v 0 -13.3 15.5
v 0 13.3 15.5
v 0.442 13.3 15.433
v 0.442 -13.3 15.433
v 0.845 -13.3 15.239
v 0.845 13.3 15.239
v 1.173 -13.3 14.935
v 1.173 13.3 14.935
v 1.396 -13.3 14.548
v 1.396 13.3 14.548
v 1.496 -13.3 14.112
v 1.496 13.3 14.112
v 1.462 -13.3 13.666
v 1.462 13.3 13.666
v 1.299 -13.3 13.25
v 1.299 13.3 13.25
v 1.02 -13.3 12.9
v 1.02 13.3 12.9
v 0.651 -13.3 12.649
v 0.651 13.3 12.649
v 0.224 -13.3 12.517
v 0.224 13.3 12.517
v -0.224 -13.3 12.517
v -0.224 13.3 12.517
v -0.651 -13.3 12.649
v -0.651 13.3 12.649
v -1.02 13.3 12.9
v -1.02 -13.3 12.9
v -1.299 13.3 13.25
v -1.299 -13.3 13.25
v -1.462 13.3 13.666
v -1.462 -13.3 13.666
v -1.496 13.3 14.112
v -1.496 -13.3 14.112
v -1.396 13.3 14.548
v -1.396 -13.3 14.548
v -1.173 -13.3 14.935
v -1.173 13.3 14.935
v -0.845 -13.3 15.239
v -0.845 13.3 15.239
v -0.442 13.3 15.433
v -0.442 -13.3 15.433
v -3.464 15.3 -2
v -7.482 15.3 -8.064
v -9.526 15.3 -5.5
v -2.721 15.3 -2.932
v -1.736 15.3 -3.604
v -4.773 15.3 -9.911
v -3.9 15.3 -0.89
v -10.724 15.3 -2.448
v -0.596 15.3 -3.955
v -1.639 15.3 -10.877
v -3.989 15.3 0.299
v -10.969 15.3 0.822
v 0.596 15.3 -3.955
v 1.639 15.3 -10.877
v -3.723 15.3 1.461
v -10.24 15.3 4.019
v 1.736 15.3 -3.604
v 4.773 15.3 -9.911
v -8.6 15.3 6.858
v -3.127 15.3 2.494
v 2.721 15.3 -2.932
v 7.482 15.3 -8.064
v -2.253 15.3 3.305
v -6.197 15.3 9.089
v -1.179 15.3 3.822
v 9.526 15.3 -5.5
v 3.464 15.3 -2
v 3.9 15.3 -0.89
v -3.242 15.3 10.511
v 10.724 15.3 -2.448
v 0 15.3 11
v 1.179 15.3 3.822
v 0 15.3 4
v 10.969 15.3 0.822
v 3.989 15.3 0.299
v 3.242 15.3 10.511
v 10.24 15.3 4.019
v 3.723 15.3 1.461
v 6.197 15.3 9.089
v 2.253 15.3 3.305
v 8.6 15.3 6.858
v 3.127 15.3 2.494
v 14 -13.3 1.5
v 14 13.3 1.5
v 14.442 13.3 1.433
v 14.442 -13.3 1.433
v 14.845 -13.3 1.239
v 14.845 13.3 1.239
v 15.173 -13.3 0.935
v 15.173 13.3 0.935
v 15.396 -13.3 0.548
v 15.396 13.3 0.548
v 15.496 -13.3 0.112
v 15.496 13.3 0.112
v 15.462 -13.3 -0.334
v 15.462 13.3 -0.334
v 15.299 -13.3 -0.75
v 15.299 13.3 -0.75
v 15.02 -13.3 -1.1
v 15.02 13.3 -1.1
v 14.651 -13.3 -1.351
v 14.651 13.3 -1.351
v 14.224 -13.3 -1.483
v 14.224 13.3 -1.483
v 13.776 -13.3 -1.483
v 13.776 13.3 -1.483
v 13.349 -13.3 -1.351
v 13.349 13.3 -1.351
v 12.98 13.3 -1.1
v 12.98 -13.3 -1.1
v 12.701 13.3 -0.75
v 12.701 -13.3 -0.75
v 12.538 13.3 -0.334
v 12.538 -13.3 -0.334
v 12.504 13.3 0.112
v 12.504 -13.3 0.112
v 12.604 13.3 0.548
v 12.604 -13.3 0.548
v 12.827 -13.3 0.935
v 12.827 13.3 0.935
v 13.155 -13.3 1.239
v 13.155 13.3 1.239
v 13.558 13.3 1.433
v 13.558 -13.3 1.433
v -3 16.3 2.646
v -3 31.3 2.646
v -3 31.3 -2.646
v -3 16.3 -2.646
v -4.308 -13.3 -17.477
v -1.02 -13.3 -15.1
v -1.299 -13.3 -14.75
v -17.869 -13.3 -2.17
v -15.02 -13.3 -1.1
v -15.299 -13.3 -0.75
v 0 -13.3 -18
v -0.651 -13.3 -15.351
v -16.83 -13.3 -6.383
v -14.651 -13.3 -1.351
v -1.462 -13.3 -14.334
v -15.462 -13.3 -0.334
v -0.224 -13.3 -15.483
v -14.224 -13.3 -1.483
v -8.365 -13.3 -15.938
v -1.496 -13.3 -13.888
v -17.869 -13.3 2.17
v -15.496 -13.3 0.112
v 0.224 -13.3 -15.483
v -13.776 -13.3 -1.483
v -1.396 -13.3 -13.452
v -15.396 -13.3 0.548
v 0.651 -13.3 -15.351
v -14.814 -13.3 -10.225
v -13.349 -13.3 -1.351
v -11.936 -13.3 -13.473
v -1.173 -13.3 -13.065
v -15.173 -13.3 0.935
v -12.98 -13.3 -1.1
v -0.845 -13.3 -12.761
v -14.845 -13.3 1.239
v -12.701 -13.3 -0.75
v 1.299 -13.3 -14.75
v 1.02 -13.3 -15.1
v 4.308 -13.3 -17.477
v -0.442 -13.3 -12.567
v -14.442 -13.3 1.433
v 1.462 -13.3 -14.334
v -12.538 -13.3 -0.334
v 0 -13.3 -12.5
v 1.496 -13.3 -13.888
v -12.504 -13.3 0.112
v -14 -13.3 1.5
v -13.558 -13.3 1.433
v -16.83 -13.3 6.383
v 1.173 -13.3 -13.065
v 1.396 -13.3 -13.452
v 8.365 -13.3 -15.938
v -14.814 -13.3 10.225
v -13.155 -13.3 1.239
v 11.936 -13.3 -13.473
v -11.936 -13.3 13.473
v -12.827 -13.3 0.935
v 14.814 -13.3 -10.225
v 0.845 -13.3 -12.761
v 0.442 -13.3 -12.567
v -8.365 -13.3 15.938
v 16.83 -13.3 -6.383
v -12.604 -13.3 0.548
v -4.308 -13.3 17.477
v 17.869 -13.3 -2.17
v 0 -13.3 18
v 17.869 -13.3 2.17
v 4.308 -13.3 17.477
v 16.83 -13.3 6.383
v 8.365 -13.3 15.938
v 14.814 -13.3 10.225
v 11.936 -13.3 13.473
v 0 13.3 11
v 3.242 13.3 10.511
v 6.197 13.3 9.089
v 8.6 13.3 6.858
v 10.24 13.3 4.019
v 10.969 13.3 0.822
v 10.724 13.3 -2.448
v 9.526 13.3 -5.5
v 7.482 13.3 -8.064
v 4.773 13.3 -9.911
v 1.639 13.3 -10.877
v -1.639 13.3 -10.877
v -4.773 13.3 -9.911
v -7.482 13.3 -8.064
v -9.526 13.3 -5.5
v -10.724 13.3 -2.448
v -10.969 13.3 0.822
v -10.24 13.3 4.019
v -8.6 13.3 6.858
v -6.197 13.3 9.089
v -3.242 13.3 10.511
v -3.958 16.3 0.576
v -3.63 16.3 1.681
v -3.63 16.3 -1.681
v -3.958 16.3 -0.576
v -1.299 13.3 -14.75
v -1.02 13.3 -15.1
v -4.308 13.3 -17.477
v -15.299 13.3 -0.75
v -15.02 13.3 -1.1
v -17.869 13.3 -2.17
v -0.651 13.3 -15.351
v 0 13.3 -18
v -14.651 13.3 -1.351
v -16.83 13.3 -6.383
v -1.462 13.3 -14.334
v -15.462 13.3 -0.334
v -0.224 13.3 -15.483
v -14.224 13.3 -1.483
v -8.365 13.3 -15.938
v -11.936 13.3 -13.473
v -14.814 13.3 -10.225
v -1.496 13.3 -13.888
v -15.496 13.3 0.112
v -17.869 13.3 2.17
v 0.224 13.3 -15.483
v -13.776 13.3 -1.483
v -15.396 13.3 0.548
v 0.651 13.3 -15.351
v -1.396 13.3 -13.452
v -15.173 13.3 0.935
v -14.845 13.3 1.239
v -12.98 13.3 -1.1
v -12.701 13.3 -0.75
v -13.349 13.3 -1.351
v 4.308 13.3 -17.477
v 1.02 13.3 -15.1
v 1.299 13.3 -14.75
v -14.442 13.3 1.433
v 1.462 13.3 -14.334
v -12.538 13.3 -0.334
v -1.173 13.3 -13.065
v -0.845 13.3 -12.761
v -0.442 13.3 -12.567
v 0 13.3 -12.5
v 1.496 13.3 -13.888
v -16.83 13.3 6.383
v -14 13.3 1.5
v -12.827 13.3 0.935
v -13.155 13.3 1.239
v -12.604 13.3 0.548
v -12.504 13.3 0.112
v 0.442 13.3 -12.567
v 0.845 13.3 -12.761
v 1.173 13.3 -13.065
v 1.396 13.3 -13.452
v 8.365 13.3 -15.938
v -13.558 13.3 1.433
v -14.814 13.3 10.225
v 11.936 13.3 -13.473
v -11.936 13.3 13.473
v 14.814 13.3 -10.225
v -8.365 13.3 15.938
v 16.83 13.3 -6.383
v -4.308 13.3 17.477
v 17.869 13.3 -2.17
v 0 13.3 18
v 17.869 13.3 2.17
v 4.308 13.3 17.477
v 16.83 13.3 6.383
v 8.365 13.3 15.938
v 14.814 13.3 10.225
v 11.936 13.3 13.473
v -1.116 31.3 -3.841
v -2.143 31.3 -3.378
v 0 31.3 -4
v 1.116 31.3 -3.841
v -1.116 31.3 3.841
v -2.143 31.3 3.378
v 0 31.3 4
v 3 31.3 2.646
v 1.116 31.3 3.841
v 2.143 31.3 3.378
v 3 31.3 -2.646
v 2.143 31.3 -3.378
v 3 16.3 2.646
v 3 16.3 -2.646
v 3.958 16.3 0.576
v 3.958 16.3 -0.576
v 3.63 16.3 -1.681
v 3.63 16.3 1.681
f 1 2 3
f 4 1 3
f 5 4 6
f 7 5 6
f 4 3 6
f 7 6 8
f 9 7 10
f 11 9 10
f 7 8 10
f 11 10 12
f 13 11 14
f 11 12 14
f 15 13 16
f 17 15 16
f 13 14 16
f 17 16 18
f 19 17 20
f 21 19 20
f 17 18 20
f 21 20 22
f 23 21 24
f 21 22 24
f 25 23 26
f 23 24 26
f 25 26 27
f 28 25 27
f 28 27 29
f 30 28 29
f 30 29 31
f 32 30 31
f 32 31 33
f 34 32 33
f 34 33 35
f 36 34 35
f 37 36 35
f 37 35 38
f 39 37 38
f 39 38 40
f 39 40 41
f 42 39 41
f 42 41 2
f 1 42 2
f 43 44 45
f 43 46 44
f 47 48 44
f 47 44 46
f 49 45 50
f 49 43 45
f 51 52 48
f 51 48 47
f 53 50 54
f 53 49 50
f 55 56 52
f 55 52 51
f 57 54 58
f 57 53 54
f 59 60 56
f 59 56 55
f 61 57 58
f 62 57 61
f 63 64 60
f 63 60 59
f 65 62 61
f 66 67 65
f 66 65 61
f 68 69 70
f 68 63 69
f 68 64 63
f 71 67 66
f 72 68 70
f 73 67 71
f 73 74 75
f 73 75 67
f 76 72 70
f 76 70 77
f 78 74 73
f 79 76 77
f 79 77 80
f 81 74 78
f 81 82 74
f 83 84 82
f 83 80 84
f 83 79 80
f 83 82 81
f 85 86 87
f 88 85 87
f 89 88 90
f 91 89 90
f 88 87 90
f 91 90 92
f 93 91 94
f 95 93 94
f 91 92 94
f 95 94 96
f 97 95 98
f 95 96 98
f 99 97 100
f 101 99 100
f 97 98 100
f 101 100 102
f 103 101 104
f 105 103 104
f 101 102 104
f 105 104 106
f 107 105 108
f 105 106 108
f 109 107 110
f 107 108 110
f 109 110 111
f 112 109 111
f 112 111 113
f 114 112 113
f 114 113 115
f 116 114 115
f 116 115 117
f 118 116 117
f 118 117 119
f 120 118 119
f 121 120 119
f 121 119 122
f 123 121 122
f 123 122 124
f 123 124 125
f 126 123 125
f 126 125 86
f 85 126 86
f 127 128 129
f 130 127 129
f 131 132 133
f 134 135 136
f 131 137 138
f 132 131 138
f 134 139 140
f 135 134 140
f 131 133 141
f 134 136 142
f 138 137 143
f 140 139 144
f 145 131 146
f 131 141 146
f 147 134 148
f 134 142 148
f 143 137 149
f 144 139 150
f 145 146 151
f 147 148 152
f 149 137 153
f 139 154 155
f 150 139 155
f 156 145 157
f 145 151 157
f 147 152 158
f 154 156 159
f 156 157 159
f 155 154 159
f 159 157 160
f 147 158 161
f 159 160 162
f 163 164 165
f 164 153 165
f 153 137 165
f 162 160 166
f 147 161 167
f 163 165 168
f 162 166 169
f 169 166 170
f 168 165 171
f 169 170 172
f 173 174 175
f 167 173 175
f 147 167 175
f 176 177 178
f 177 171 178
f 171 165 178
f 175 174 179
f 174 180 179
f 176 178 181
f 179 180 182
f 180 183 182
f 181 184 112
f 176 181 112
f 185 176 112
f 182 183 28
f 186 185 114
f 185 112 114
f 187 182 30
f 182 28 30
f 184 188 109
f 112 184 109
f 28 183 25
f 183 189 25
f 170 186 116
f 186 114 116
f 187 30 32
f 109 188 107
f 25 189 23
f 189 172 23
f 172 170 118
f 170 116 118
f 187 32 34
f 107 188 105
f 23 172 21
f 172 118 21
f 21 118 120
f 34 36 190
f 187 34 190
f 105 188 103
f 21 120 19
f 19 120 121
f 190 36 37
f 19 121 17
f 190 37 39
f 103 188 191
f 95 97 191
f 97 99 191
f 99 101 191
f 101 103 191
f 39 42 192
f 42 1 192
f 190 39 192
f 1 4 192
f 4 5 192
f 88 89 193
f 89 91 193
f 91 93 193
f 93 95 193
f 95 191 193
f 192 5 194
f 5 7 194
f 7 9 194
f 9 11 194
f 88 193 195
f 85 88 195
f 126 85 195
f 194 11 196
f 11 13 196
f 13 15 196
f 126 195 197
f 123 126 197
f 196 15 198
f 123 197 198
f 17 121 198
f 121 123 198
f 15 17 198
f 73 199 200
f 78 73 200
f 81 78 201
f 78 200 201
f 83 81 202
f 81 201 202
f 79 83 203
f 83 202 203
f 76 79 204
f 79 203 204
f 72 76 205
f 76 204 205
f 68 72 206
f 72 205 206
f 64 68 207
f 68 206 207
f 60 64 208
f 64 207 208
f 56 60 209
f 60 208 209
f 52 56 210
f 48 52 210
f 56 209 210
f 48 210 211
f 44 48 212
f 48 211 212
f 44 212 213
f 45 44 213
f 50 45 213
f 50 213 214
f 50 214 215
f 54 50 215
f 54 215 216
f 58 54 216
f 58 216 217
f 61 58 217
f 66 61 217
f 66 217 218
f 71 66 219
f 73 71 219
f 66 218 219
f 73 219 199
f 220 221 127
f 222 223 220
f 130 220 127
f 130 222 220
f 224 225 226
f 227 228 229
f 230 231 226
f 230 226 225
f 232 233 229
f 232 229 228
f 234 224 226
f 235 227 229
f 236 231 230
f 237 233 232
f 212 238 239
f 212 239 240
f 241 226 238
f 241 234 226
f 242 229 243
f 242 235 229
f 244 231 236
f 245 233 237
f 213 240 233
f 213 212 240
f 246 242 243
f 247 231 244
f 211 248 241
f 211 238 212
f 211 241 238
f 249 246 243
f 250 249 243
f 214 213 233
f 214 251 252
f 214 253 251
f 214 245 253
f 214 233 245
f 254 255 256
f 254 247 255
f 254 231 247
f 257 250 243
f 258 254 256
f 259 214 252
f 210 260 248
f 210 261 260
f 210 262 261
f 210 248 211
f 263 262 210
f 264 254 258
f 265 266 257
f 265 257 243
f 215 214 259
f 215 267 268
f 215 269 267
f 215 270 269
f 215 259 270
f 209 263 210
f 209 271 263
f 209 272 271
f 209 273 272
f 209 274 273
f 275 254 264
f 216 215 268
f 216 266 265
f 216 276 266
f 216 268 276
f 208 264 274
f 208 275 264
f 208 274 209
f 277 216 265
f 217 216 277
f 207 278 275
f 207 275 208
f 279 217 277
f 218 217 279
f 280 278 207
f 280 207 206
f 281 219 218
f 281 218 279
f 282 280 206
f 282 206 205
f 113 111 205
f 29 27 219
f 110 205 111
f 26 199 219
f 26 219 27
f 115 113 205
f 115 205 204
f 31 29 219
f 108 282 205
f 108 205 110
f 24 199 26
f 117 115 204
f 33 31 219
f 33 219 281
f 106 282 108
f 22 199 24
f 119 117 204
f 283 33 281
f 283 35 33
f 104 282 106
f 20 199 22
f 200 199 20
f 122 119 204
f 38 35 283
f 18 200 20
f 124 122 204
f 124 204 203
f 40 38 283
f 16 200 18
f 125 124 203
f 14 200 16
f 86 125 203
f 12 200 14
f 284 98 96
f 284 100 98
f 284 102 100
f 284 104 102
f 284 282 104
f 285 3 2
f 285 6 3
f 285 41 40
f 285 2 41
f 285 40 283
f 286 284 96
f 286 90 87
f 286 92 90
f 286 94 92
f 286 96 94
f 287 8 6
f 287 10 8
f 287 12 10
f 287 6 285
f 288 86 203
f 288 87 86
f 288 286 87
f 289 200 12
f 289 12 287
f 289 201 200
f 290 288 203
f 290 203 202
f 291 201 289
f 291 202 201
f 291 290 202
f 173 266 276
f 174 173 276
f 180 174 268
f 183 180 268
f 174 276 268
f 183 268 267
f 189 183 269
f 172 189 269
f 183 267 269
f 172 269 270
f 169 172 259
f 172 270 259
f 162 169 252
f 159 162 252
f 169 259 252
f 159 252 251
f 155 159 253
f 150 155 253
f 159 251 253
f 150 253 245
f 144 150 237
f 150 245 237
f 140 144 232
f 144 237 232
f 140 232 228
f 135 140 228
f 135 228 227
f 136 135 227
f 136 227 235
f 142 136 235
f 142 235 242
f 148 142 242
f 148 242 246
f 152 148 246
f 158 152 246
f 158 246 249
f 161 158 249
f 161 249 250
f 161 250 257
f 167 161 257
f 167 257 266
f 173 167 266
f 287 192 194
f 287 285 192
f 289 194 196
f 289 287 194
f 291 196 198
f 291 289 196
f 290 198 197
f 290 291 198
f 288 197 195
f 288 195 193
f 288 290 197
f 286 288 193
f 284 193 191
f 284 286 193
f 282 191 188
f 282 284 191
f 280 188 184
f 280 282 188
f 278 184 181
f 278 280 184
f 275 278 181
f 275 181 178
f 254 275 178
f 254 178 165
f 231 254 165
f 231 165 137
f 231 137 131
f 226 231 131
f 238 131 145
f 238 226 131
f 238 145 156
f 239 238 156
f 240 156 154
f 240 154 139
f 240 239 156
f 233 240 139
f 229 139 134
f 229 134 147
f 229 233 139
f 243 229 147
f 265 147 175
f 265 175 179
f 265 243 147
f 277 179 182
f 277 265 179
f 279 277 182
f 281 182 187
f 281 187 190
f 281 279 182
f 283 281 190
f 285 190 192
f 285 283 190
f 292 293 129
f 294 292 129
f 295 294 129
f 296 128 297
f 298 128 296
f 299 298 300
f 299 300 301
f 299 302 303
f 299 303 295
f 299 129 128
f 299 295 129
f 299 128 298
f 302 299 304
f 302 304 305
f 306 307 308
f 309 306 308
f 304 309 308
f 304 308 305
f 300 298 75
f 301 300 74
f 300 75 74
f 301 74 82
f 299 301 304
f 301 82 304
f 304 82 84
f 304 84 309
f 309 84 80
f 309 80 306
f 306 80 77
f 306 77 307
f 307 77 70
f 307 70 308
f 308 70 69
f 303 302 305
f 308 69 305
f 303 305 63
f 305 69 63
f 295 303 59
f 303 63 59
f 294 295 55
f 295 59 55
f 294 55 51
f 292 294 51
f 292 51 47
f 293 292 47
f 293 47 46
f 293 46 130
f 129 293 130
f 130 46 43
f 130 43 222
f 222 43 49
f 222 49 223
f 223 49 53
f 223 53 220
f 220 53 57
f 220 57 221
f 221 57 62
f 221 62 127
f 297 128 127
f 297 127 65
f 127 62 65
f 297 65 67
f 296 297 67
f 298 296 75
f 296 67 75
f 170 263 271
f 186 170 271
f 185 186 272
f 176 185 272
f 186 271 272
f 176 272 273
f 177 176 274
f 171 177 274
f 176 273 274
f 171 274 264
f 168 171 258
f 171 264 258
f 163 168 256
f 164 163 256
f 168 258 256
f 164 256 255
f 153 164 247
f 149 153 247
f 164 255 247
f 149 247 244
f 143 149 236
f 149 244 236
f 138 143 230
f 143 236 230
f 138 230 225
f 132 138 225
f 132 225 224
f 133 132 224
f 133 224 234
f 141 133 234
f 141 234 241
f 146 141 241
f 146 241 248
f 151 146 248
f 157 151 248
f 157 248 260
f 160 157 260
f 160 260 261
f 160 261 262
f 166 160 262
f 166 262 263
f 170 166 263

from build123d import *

# Parameters (mm, degrees)
SKETCH1_R           = 18
BOSS_EXTRUDE1_DEPTH = 13.3
SKETCH2_R           = 11
BOSS_EXTRUDE2_DEPTH = 2
SKETCH4_R           = 1.5
CUT_EXTRUDE1_DEPTH  = 39.287857083
SKETCH5_R           = 4
BOSS_EXTRUDE3_DEPTH = 16
CUT_EXTRUDE2_DEPTH  = 15


with BuildPart() as part:
    # Sketch1 → Boss-Extrude1 (new, symmetric)
    with BuildSketch(Plane(origin=(0, 0, 0), x_dir=(1, 0, 0), z_dir=(0, 1, 0))):
        with Locations(Location((0, 0, 0), (0, 0, 270))):
            Circle(SKETCH1_R)
    extrude(amount=BOSS_EXTRUDE1_DEPTH, both=True)

    # Sketch2 → Boss-Extrude2 (add)
    with BuildSketch(Plane(origin=(0, 13.3, 0), x_dir=(1, 0, 0), z_dir=(0, 1, 0))):
        with Locations(Location((0, 0, 0), (0, 0, 270))):
            Circle(SKETCH2_R)
    extrude(amount=BOSS_EXTRUDE2_DEPTH)

    # Sketch4 → Cut-Extrude1 (cut, through all)
    with BuildSketch(Plane(origin=(0, 15.3, 0), x_dir=(1, 0, 0), z_dir=(0, 1, 0))):
        with Locations(Location((-14, 0, 0), (0, 0, 270))):
            Circle(SKETCH4_R)
        with Locations(Location((0, -14, 0), (0, 0, 270))):
            Circle(SKETCH4_R)
        with Locations(Location((14, 0, 0), (0, 0, 270))):
            Circle(SKETCH4_R)
        with Locations(Location((0, 14, 0), (0, 0, 270))):
            Circle(SKETCH4_R)
    extrude(amount=-CUT_EXTRUDE1_DEPTH, mode=Mode.SUBTRACT)

    # Sketch5 → Boss-Extrude3 (add)
    with BuildSketch(Plane(origin=(0, 15.3, 0), x_dir=(1, 0, 0), z_dir=(0, 1, 0))):
        with Locations(Location((0, 0, 0), (0, 0, 270))):
            Circle(SKETCH5_R)
    extrude(amount=BOSS_EXTRUDE3_DEPTH)

    # Sketch6 → Cut-Extrude2 (cut)
    with BuildSketch(Plane(origin=(0, 31.3, 0), x_dir=(1, 0, 0), z_dir=(0, 1, 0))):
        with BuildLine():
            Line((-3, -4), (-3, 4))
            ThreePointArc((-3, 4), (-5, 0), (-3, -4))
        make_face()
        with BuildLine():
            Line((3, -4), (3, 4))
            ThreePointArc((3, 4), (5, 0), (3, -4))
        make_face()
    extrude(amount=-CUT_EXTRUDE2_DEPTH, mode=Mode.SUBTRACT)


solid = part.part
